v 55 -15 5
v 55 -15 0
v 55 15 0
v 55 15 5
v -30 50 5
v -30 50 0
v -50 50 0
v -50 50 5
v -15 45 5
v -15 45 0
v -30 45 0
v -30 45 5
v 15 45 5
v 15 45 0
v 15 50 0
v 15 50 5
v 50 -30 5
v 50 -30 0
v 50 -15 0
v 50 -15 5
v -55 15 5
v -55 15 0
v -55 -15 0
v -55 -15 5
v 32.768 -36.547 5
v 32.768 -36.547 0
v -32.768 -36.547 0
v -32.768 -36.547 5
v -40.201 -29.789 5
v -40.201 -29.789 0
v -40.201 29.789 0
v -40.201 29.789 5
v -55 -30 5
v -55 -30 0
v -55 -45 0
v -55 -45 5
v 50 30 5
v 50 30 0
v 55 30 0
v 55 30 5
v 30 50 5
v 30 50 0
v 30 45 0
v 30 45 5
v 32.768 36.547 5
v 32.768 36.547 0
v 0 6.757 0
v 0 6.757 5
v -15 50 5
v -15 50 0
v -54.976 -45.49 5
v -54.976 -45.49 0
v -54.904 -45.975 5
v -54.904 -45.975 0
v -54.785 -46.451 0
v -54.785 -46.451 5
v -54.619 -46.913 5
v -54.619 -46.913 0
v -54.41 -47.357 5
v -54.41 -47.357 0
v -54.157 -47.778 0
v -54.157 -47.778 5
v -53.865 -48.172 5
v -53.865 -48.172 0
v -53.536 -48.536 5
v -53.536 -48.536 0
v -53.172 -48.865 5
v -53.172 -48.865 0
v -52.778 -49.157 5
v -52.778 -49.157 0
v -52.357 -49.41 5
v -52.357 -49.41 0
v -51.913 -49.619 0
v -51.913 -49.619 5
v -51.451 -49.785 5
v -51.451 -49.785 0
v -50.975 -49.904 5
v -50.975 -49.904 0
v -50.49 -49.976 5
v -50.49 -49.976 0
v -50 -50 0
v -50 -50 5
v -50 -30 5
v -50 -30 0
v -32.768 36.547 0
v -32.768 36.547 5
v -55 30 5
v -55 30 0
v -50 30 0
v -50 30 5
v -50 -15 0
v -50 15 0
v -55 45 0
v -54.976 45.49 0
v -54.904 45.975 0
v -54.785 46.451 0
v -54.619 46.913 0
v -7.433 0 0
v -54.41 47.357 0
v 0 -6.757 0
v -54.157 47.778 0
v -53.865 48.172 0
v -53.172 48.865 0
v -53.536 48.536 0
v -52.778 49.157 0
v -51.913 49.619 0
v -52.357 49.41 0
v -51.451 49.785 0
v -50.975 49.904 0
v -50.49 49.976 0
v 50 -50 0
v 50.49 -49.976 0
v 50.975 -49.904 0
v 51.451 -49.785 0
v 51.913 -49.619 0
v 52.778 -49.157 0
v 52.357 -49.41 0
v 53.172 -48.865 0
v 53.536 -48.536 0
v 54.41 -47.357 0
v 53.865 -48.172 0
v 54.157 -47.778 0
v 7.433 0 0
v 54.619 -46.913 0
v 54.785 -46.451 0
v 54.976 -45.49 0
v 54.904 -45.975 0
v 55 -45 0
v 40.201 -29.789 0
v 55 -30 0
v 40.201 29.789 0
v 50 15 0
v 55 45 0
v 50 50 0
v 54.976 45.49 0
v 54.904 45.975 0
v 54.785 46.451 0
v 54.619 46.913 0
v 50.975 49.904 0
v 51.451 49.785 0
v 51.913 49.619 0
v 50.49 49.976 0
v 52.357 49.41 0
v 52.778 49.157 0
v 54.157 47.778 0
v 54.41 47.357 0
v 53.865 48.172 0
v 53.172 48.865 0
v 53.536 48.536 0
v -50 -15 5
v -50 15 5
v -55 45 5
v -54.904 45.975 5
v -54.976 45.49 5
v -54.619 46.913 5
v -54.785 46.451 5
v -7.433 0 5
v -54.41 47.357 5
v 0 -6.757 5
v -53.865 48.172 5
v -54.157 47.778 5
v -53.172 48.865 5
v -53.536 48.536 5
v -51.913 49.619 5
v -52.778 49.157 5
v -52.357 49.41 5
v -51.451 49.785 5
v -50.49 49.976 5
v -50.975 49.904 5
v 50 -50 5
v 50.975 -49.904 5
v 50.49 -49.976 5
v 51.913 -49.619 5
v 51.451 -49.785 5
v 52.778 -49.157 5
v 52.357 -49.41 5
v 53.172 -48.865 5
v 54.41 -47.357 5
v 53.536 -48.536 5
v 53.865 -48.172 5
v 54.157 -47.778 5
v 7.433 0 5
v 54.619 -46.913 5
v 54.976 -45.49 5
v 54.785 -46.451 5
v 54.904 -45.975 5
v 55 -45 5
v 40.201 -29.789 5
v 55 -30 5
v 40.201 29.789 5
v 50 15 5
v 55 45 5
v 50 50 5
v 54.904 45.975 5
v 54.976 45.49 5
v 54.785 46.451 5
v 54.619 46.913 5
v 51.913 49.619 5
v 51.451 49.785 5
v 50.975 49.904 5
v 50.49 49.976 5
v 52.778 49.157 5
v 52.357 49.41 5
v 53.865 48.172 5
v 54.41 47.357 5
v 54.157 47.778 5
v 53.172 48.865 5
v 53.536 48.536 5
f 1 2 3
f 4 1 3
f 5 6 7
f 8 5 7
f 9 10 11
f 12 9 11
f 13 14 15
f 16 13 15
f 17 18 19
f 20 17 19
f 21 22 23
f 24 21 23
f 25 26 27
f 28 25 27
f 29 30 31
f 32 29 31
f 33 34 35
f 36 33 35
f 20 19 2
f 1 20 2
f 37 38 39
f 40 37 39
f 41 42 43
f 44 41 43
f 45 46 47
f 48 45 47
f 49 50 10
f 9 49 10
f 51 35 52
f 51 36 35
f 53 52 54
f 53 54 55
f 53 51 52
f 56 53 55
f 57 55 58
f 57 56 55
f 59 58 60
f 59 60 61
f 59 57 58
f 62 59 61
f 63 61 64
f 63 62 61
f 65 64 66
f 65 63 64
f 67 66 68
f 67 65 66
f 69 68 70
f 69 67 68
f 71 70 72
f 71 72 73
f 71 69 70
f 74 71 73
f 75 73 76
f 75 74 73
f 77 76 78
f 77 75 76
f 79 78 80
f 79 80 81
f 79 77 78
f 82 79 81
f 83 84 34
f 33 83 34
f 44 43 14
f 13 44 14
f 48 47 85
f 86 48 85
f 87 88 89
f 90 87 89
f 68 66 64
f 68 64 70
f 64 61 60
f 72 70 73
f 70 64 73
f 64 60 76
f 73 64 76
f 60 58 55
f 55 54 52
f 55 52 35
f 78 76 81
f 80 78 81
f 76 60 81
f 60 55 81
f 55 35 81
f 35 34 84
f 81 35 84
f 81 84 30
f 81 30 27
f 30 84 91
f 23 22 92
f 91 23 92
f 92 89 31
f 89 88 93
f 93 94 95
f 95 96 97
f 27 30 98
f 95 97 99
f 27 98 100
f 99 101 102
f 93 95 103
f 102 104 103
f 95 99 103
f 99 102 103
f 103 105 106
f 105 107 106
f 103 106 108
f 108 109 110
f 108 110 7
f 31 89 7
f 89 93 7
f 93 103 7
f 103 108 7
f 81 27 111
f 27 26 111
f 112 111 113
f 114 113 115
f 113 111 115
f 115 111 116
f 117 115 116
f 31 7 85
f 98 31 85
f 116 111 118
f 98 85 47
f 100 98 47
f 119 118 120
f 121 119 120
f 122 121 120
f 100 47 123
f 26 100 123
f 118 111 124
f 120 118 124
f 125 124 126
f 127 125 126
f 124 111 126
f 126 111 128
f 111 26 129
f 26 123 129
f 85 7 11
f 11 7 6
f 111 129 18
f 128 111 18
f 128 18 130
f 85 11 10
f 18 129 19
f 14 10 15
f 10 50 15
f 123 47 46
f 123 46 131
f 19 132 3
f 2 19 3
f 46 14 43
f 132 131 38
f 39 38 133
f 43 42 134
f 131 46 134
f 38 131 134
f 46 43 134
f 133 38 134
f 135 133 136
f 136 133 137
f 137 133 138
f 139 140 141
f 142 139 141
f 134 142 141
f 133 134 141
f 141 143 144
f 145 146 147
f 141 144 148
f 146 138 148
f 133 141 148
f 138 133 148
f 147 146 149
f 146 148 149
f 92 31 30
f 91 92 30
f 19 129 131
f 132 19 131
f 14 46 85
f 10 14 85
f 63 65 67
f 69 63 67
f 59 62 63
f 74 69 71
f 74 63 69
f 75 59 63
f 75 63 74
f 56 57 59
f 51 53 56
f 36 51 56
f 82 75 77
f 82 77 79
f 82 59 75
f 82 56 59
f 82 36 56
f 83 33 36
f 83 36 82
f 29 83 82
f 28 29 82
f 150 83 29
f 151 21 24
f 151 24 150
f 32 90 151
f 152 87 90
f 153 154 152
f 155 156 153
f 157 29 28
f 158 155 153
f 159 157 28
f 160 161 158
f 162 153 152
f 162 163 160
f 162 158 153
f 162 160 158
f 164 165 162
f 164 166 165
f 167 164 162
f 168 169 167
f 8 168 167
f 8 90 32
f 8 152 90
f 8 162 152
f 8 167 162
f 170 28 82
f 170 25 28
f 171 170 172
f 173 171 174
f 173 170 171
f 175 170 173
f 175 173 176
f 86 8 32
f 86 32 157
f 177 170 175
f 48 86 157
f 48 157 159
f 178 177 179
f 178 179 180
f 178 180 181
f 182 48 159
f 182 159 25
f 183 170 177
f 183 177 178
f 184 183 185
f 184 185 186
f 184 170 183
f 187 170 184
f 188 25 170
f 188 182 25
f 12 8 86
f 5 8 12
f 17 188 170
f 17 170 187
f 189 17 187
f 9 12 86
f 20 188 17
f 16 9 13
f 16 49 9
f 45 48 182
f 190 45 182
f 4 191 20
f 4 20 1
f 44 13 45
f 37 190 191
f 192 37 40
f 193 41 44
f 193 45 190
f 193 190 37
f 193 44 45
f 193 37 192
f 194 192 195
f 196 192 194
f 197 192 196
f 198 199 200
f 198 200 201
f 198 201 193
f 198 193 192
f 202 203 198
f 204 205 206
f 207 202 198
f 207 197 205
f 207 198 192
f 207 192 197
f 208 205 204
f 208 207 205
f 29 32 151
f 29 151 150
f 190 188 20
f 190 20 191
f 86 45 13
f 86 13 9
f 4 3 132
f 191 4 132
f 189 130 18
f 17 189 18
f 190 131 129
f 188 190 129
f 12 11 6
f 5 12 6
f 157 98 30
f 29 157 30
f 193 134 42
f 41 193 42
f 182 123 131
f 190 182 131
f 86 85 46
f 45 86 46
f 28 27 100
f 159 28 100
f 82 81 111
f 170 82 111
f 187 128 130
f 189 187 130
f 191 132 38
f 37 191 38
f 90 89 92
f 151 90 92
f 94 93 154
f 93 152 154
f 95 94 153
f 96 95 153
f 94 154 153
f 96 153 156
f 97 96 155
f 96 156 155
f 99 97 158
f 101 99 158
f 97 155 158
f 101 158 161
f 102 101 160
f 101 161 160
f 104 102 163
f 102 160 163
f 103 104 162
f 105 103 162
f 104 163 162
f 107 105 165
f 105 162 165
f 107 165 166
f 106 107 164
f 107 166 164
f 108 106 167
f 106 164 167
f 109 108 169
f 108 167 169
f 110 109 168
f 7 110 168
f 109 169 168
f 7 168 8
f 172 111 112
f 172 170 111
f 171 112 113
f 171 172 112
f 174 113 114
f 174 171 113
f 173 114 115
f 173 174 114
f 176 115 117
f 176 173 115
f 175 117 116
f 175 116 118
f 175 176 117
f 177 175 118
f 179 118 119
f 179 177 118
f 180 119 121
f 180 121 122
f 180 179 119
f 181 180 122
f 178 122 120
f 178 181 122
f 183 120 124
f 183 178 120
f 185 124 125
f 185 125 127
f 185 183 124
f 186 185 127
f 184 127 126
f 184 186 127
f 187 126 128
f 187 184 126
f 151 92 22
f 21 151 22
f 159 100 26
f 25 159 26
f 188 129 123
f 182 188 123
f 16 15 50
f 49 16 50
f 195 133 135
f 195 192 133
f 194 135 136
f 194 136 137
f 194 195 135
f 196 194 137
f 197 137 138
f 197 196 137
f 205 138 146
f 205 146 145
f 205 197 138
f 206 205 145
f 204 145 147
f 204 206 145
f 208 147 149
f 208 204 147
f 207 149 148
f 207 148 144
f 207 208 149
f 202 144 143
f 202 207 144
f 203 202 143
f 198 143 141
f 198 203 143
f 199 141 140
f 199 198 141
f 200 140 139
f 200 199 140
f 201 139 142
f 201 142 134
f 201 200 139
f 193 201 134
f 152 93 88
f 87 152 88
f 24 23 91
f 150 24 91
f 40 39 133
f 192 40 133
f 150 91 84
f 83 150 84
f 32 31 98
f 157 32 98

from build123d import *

# Parameters (mm, degrees)
F1_DEPTH = 5
F2_R     = 5
F3_R     = 5


with BuildPart() as f1:
    # F0 (on Top) → F1 (new body)
    with BuildSketch(Plane.XY):
        Polygon((-55, -30), (-55, -50), (55, -50), (55, -30), (50, -30), (50, -15), (55, -15), (55, 15), (50, 15), (50, 30), (55, 30), (55, 50), (30, 50), (30, 45), (15, 45), (15, 50), (-15, 50), (-15, 45), (-30, 45), (-30, 50), (-55, 50), (-55, 30), (-50, 30), (-50, 15), (-55, 15), (-55, -15), (-50, -15), (-50, -30), align=None)
        Polygon((-40.201199, -29.78924), (-40.201199, 29.78924), (-7.433034, 0), align=None, mode=Mode.SUBTRACT)
        Polygon((0, -6.757304), (32.768164, -36.546544), (-32.768164, -36.546544), align=None, mode=Mode.SUBTRACT)
        Polygon((-32.768164, 36.546544), (32.768164, 36.546544), (0, 6.757304), align=None, mode=Mode.SUBTRACT)
        Polygon((7.433034, 0), (40.201199, 29.78924), (40.201199, -29.78924), align=None, mode=Mode.SUBTRACT)
    extrude(amount=F1_DEPTH)

    # F2
    f2_edges = [f1.edges().sort_by_distance(p)[0] for p in [
        (55, 50, 2.5),
        (-55, 50, 2.5),
    ]]
    fillet(f2_edges, radius=F2_R)

    # F3
    f3_edges = [f1.edges().sort_by_distance(p)[0] for p in [
        (55, -50, 2.5),
        (-55, -50, 2.5),
    ]]
    fillet(f3_edges, radius=F3_R)


solid = f1.part
